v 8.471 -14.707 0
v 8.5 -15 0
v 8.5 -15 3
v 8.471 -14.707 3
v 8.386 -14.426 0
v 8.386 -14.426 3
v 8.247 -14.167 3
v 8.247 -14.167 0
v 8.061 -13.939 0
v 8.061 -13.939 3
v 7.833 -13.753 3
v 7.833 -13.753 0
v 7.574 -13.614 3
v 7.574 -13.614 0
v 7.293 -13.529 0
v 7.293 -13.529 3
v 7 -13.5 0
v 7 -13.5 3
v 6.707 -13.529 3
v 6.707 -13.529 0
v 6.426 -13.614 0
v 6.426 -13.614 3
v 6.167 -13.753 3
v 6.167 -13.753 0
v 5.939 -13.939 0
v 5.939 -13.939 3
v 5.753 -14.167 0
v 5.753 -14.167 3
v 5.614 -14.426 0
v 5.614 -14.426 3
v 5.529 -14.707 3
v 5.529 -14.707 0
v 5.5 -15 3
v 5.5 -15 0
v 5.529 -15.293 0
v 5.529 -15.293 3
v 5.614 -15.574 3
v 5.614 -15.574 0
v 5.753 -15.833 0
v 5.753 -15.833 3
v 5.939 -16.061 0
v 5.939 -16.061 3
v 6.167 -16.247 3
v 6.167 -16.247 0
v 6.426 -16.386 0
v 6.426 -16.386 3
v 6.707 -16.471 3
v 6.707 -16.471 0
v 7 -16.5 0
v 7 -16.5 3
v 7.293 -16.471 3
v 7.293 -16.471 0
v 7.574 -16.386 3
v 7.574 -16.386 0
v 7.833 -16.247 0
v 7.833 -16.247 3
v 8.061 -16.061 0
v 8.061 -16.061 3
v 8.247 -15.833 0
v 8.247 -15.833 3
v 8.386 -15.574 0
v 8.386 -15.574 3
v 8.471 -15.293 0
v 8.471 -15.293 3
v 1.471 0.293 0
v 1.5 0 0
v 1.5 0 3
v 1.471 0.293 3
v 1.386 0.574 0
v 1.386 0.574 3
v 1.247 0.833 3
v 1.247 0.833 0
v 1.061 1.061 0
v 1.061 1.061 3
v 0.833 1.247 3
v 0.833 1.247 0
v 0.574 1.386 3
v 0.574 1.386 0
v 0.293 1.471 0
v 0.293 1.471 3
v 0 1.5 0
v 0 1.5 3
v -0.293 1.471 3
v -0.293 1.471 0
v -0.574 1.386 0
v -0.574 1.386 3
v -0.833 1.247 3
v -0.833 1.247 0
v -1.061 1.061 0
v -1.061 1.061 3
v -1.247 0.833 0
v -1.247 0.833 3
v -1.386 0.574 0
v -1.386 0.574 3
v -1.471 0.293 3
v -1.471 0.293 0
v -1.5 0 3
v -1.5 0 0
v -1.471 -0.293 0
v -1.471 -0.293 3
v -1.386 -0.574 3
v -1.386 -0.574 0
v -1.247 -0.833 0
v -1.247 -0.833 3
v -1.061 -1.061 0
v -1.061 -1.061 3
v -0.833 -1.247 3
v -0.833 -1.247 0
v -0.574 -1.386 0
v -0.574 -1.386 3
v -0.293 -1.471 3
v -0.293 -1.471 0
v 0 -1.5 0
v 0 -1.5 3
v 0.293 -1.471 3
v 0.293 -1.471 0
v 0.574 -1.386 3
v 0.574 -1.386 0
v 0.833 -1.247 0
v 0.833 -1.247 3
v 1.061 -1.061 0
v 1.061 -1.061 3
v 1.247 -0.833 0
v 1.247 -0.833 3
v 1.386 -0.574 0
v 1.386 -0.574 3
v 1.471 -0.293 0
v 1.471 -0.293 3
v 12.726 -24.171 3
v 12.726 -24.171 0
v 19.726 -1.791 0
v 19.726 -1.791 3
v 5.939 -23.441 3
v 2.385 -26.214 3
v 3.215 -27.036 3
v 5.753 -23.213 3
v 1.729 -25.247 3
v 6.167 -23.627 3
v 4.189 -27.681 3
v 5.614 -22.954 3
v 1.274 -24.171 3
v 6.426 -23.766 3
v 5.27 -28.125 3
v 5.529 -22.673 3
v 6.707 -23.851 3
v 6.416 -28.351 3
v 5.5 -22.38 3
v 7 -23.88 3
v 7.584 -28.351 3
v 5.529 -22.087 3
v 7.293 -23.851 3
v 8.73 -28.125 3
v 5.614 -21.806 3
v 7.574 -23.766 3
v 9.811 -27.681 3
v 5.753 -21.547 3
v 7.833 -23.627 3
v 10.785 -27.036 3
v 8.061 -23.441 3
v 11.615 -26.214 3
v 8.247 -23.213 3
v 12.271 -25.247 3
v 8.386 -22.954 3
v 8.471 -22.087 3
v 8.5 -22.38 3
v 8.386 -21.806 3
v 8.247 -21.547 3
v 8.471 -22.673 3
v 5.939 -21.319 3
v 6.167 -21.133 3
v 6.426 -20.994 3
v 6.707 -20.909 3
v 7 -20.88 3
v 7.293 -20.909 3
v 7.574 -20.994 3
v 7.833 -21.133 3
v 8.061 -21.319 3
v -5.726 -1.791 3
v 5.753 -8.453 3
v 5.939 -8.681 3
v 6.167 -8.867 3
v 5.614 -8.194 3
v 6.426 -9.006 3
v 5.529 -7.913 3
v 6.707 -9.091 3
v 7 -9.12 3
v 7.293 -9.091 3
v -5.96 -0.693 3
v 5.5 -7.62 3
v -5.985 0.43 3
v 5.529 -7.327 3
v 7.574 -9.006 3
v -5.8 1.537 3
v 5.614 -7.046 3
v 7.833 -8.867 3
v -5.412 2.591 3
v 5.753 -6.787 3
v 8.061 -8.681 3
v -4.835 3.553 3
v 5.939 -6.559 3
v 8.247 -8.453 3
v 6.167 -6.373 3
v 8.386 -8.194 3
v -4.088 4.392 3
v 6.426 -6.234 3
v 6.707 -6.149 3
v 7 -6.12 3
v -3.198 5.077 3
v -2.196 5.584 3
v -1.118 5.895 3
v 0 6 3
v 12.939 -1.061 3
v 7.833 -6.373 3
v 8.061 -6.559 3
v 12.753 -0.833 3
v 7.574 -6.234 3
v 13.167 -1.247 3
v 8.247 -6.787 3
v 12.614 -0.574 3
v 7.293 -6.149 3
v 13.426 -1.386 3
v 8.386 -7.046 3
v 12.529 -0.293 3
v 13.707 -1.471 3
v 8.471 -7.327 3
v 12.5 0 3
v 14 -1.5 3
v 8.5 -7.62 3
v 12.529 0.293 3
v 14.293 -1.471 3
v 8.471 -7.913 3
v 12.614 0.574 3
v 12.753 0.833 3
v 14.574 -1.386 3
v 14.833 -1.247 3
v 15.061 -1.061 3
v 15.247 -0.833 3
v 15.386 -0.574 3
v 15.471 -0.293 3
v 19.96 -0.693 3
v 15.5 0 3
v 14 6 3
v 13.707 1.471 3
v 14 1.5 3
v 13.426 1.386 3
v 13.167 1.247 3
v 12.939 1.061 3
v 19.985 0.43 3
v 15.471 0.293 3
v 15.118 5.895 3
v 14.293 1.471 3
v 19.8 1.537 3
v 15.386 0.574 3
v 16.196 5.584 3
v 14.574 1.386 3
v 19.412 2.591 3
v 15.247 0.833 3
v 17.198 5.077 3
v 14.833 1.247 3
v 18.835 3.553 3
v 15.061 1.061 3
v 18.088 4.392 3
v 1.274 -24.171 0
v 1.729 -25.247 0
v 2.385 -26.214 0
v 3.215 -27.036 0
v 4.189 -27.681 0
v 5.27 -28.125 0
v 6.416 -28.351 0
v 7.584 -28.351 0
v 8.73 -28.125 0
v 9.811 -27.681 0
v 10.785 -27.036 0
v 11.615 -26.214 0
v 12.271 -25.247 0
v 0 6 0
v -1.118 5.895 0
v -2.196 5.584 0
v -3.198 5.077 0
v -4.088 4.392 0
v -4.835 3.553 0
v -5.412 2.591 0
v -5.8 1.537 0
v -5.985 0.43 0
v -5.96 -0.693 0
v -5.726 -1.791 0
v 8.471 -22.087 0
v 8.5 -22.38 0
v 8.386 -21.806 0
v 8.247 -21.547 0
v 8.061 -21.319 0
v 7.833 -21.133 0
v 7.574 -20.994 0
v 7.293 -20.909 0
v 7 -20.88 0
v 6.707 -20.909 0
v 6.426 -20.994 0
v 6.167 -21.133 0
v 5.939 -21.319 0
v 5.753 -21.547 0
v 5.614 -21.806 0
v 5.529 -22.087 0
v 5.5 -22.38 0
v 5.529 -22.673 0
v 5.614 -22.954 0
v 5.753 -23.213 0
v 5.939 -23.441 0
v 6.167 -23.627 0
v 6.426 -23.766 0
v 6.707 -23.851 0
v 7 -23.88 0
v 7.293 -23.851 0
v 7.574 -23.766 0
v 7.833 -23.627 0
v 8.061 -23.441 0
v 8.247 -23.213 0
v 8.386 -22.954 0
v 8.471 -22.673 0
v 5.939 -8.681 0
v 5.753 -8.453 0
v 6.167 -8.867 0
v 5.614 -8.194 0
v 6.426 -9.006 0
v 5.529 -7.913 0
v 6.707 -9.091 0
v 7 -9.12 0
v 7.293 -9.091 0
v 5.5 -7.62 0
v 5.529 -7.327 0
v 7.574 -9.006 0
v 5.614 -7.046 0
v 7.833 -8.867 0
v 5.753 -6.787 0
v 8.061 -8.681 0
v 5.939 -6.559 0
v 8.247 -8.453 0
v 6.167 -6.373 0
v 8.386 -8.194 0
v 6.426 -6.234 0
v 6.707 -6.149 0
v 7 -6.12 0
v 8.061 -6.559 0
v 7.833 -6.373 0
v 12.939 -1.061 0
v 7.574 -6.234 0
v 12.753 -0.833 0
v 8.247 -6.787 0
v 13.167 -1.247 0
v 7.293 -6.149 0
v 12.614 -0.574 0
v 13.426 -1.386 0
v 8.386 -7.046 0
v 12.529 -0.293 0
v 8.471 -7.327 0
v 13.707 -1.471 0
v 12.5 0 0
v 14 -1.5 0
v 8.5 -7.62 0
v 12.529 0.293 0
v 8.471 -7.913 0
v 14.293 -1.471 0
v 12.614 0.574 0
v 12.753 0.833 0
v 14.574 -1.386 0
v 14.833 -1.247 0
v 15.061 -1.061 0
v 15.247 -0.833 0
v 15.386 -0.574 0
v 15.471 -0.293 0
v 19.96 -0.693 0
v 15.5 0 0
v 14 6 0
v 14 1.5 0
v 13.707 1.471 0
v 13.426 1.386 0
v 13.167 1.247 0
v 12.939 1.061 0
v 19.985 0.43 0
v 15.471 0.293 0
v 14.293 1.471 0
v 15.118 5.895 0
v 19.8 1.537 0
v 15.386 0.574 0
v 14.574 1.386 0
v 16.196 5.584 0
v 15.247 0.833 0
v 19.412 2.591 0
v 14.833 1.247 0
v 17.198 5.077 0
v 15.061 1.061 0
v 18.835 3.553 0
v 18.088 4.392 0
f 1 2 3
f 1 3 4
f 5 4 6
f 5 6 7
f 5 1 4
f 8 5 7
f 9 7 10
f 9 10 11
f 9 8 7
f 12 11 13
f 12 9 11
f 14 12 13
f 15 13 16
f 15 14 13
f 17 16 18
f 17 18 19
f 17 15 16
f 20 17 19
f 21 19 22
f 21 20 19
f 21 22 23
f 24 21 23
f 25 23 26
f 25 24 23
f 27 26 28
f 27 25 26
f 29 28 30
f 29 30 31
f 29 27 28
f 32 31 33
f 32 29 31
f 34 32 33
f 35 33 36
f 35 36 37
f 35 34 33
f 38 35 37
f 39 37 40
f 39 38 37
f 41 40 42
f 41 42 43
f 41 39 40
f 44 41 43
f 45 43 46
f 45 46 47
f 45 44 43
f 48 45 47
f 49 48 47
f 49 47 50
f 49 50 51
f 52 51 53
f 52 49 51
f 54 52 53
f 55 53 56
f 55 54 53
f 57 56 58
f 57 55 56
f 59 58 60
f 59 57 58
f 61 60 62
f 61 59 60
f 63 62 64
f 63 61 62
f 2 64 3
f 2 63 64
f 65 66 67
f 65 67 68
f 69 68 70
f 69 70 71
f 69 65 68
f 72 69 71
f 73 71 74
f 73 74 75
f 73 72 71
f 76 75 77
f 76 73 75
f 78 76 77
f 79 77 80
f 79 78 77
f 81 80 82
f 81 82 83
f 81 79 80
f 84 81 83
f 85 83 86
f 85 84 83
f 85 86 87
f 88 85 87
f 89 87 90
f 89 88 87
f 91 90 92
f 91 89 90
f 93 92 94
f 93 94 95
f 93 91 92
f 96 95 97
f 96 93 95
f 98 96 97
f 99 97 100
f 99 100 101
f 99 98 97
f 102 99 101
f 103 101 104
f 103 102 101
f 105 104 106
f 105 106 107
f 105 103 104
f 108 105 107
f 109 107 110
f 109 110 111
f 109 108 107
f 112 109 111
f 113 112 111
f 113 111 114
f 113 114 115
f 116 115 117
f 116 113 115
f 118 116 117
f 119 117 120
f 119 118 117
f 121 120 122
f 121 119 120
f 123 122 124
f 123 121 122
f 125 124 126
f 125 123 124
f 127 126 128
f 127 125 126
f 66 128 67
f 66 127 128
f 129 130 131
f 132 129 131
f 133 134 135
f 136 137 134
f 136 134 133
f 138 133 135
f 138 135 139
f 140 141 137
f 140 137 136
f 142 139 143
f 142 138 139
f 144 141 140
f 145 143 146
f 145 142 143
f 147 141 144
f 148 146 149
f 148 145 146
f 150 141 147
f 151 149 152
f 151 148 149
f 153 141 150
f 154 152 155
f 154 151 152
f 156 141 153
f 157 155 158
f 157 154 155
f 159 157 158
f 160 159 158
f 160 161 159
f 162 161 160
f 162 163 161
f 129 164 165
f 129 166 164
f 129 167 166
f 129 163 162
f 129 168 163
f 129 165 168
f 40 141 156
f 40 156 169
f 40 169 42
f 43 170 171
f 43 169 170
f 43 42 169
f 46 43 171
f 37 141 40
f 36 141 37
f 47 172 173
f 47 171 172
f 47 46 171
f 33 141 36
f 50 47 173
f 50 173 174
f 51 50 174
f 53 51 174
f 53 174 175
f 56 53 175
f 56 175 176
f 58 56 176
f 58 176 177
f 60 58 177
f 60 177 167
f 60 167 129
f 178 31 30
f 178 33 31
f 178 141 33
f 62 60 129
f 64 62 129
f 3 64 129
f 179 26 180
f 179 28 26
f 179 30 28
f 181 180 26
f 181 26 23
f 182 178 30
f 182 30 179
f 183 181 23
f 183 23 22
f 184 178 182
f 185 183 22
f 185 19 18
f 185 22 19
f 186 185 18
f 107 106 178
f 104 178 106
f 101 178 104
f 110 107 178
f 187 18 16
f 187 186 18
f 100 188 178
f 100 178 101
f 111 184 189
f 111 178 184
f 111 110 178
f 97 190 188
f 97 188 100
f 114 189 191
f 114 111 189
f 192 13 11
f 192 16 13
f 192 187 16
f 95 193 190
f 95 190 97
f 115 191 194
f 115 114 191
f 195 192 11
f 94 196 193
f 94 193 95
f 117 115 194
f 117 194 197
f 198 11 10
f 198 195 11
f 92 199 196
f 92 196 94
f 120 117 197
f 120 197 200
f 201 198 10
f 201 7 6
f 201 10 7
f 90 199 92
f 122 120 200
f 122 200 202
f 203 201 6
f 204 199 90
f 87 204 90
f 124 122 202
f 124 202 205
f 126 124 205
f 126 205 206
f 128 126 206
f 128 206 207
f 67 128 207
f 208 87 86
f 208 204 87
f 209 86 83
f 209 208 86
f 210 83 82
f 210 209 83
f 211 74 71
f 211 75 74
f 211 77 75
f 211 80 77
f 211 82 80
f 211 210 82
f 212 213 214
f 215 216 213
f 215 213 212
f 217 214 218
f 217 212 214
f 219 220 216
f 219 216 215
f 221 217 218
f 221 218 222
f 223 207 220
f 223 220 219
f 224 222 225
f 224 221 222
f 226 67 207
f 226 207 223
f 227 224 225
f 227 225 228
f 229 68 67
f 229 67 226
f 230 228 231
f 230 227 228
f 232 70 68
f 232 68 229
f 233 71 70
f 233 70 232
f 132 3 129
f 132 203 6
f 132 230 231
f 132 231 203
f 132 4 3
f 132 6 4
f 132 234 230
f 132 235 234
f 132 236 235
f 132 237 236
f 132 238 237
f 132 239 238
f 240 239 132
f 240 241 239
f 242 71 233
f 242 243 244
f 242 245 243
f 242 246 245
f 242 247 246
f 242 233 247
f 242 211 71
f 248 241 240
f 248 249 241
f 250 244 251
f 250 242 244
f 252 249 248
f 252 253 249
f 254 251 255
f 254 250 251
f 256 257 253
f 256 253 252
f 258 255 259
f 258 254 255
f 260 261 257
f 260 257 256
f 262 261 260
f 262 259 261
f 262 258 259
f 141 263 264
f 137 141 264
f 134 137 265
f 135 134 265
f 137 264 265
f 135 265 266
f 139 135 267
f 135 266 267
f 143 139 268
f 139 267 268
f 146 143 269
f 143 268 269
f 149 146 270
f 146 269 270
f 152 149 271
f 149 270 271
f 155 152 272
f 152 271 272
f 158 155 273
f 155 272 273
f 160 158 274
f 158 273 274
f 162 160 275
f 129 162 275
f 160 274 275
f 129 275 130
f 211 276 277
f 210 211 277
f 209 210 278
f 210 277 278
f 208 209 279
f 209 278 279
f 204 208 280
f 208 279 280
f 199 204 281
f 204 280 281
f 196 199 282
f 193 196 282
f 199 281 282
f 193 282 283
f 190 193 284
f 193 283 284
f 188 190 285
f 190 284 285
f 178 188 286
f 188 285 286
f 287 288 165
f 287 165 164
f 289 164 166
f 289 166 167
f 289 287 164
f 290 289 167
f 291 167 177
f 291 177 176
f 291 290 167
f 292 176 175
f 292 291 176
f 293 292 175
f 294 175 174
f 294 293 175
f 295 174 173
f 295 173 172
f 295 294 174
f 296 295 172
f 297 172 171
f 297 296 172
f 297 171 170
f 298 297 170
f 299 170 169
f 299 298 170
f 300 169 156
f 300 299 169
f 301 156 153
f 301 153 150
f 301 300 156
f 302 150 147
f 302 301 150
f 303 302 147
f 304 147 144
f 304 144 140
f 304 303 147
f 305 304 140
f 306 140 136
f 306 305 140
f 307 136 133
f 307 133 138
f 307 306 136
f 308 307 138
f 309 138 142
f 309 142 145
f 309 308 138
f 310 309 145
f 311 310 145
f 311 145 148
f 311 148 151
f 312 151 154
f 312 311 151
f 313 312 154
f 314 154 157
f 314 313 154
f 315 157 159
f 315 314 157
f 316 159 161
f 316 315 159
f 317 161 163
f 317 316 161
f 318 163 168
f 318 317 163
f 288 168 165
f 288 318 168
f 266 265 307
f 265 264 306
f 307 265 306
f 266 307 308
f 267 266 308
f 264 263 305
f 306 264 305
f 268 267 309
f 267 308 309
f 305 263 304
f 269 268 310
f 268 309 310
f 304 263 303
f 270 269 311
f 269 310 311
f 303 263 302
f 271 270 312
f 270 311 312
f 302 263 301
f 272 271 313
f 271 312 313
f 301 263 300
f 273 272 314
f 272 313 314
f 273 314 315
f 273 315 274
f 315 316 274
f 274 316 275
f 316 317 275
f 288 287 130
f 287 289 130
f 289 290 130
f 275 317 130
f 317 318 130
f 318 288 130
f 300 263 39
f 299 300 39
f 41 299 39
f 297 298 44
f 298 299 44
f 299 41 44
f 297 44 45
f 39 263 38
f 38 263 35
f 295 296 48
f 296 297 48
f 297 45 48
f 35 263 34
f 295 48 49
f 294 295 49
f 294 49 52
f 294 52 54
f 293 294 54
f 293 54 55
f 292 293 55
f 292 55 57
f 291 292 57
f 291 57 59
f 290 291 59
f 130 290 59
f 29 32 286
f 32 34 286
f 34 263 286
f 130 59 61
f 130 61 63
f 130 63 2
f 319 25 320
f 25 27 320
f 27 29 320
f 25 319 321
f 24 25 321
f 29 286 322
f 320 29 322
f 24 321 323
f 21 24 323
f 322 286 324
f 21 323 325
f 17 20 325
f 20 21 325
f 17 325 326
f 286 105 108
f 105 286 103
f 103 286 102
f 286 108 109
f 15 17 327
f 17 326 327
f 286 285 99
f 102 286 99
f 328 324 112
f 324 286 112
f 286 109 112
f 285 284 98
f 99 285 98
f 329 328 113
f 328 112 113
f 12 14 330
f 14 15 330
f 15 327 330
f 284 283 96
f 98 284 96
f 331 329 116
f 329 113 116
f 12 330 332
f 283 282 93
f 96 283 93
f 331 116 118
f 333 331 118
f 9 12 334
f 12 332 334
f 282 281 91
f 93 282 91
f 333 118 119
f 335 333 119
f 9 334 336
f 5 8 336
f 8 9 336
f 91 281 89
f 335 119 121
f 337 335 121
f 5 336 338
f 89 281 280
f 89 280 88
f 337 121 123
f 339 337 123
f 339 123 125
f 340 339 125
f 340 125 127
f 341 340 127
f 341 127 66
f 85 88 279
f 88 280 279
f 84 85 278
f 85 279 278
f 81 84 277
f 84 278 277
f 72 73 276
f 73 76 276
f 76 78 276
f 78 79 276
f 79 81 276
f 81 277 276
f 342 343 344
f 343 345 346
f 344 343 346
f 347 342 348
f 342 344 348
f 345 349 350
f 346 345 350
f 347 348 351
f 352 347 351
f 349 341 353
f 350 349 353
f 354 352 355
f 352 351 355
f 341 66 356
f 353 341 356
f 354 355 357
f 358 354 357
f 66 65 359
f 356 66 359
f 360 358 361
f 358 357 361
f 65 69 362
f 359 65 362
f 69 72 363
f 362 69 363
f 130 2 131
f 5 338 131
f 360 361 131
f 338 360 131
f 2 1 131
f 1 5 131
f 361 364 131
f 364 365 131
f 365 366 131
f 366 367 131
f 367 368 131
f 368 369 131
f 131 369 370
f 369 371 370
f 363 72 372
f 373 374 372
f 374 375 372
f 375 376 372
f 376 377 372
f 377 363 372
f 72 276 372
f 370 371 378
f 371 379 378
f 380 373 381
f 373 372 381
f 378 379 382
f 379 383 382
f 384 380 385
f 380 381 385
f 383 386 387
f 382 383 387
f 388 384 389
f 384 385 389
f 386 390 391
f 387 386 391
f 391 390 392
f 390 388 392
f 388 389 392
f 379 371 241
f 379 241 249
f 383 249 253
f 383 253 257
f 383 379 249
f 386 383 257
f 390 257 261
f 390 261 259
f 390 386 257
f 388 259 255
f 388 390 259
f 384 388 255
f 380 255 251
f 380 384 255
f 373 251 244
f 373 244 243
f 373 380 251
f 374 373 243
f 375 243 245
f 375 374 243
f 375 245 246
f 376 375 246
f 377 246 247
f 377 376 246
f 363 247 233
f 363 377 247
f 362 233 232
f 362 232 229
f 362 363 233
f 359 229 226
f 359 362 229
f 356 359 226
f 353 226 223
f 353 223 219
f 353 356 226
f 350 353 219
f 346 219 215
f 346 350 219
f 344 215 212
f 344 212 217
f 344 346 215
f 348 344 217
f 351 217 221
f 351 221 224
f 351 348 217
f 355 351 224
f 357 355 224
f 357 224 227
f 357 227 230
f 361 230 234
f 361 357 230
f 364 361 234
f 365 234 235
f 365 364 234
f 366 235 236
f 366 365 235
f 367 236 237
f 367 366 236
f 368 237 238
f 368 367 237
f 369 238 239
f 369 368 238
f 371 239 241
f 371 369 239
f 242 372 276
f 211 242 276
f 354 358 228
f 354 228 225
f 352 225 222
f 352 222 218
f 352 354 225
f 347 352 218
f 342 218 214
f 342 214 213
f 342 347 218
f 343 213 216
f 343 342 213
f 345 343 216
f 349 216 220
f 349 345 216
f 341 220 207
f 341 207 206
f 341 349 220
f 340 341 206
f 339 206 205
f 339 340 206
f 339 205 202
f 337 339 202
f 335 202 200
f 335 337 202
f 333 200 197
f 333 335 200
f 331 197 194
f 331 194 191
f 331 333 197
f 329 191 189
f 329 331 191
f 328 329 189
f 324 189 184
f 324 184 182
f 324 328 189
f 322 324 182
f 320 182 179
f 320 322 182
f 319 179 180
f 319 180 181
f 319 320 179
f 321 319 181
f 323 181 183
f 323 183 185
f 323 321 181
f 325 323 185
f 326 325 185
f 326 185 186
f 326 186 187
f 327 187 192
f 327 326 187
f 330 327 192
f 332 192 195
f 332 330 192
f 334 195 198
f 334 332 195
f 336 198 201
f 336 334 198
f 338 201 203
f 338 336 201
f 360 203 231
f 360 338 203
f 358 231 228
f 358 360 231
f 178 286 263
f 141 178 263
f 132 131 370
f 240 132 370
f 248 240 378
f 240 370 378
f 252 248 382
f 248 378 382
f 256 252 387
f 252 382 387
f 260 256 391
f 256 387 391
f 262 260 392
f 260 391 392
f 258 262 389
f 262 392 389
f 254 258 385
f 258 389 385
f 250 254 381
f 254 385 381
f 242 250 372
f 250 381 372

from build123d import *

# Parameters (mm, degrees)
F0_R     = 1.5
F1_DEPTH = 3


with BuildPart() as f1:
    # F0 (on Top) → F1 (new body)
    with BuildSketch(Plane.XY):
        with BuildLine():
            Line((14, 6), (0, 6))
            ThreePointArc((0, 6), (-4.834596, 3.553404), (-5.726424, -1.791107))
            Line((-5.726424, -1.791107), (1.273576, -24.171107))
            ThreePointArc((1.273576, -24.171107), (7, -28.38), (12.726424, -24.171107))
            Line((12.726424, -24.171107), (19.726424, -1.791107))
            ThreePointArc((19.726424, -1.791107), (18.834596, 3.553404), (14, 6))
        make_face()
        with Locations((7, -22.38)):
            Circle(F0_R, mode=Mode.SUBTRACT)
        with Locations((7, -15)):
            Circle(F0_R, mode=Mode.SUBTRACT)
        with Locations((7, -7.62)):
            Circle(F0_R, mode=Mode.SUBTRACT)
        Circle(F0_R, mode=Mode.SUBTRACT)
        with Locations((14, 0)):
            Circle(F0_R, mode=Mode.SUBTRACT)
    extrude(amount=F1_DEPTH)


solid = f1.part
